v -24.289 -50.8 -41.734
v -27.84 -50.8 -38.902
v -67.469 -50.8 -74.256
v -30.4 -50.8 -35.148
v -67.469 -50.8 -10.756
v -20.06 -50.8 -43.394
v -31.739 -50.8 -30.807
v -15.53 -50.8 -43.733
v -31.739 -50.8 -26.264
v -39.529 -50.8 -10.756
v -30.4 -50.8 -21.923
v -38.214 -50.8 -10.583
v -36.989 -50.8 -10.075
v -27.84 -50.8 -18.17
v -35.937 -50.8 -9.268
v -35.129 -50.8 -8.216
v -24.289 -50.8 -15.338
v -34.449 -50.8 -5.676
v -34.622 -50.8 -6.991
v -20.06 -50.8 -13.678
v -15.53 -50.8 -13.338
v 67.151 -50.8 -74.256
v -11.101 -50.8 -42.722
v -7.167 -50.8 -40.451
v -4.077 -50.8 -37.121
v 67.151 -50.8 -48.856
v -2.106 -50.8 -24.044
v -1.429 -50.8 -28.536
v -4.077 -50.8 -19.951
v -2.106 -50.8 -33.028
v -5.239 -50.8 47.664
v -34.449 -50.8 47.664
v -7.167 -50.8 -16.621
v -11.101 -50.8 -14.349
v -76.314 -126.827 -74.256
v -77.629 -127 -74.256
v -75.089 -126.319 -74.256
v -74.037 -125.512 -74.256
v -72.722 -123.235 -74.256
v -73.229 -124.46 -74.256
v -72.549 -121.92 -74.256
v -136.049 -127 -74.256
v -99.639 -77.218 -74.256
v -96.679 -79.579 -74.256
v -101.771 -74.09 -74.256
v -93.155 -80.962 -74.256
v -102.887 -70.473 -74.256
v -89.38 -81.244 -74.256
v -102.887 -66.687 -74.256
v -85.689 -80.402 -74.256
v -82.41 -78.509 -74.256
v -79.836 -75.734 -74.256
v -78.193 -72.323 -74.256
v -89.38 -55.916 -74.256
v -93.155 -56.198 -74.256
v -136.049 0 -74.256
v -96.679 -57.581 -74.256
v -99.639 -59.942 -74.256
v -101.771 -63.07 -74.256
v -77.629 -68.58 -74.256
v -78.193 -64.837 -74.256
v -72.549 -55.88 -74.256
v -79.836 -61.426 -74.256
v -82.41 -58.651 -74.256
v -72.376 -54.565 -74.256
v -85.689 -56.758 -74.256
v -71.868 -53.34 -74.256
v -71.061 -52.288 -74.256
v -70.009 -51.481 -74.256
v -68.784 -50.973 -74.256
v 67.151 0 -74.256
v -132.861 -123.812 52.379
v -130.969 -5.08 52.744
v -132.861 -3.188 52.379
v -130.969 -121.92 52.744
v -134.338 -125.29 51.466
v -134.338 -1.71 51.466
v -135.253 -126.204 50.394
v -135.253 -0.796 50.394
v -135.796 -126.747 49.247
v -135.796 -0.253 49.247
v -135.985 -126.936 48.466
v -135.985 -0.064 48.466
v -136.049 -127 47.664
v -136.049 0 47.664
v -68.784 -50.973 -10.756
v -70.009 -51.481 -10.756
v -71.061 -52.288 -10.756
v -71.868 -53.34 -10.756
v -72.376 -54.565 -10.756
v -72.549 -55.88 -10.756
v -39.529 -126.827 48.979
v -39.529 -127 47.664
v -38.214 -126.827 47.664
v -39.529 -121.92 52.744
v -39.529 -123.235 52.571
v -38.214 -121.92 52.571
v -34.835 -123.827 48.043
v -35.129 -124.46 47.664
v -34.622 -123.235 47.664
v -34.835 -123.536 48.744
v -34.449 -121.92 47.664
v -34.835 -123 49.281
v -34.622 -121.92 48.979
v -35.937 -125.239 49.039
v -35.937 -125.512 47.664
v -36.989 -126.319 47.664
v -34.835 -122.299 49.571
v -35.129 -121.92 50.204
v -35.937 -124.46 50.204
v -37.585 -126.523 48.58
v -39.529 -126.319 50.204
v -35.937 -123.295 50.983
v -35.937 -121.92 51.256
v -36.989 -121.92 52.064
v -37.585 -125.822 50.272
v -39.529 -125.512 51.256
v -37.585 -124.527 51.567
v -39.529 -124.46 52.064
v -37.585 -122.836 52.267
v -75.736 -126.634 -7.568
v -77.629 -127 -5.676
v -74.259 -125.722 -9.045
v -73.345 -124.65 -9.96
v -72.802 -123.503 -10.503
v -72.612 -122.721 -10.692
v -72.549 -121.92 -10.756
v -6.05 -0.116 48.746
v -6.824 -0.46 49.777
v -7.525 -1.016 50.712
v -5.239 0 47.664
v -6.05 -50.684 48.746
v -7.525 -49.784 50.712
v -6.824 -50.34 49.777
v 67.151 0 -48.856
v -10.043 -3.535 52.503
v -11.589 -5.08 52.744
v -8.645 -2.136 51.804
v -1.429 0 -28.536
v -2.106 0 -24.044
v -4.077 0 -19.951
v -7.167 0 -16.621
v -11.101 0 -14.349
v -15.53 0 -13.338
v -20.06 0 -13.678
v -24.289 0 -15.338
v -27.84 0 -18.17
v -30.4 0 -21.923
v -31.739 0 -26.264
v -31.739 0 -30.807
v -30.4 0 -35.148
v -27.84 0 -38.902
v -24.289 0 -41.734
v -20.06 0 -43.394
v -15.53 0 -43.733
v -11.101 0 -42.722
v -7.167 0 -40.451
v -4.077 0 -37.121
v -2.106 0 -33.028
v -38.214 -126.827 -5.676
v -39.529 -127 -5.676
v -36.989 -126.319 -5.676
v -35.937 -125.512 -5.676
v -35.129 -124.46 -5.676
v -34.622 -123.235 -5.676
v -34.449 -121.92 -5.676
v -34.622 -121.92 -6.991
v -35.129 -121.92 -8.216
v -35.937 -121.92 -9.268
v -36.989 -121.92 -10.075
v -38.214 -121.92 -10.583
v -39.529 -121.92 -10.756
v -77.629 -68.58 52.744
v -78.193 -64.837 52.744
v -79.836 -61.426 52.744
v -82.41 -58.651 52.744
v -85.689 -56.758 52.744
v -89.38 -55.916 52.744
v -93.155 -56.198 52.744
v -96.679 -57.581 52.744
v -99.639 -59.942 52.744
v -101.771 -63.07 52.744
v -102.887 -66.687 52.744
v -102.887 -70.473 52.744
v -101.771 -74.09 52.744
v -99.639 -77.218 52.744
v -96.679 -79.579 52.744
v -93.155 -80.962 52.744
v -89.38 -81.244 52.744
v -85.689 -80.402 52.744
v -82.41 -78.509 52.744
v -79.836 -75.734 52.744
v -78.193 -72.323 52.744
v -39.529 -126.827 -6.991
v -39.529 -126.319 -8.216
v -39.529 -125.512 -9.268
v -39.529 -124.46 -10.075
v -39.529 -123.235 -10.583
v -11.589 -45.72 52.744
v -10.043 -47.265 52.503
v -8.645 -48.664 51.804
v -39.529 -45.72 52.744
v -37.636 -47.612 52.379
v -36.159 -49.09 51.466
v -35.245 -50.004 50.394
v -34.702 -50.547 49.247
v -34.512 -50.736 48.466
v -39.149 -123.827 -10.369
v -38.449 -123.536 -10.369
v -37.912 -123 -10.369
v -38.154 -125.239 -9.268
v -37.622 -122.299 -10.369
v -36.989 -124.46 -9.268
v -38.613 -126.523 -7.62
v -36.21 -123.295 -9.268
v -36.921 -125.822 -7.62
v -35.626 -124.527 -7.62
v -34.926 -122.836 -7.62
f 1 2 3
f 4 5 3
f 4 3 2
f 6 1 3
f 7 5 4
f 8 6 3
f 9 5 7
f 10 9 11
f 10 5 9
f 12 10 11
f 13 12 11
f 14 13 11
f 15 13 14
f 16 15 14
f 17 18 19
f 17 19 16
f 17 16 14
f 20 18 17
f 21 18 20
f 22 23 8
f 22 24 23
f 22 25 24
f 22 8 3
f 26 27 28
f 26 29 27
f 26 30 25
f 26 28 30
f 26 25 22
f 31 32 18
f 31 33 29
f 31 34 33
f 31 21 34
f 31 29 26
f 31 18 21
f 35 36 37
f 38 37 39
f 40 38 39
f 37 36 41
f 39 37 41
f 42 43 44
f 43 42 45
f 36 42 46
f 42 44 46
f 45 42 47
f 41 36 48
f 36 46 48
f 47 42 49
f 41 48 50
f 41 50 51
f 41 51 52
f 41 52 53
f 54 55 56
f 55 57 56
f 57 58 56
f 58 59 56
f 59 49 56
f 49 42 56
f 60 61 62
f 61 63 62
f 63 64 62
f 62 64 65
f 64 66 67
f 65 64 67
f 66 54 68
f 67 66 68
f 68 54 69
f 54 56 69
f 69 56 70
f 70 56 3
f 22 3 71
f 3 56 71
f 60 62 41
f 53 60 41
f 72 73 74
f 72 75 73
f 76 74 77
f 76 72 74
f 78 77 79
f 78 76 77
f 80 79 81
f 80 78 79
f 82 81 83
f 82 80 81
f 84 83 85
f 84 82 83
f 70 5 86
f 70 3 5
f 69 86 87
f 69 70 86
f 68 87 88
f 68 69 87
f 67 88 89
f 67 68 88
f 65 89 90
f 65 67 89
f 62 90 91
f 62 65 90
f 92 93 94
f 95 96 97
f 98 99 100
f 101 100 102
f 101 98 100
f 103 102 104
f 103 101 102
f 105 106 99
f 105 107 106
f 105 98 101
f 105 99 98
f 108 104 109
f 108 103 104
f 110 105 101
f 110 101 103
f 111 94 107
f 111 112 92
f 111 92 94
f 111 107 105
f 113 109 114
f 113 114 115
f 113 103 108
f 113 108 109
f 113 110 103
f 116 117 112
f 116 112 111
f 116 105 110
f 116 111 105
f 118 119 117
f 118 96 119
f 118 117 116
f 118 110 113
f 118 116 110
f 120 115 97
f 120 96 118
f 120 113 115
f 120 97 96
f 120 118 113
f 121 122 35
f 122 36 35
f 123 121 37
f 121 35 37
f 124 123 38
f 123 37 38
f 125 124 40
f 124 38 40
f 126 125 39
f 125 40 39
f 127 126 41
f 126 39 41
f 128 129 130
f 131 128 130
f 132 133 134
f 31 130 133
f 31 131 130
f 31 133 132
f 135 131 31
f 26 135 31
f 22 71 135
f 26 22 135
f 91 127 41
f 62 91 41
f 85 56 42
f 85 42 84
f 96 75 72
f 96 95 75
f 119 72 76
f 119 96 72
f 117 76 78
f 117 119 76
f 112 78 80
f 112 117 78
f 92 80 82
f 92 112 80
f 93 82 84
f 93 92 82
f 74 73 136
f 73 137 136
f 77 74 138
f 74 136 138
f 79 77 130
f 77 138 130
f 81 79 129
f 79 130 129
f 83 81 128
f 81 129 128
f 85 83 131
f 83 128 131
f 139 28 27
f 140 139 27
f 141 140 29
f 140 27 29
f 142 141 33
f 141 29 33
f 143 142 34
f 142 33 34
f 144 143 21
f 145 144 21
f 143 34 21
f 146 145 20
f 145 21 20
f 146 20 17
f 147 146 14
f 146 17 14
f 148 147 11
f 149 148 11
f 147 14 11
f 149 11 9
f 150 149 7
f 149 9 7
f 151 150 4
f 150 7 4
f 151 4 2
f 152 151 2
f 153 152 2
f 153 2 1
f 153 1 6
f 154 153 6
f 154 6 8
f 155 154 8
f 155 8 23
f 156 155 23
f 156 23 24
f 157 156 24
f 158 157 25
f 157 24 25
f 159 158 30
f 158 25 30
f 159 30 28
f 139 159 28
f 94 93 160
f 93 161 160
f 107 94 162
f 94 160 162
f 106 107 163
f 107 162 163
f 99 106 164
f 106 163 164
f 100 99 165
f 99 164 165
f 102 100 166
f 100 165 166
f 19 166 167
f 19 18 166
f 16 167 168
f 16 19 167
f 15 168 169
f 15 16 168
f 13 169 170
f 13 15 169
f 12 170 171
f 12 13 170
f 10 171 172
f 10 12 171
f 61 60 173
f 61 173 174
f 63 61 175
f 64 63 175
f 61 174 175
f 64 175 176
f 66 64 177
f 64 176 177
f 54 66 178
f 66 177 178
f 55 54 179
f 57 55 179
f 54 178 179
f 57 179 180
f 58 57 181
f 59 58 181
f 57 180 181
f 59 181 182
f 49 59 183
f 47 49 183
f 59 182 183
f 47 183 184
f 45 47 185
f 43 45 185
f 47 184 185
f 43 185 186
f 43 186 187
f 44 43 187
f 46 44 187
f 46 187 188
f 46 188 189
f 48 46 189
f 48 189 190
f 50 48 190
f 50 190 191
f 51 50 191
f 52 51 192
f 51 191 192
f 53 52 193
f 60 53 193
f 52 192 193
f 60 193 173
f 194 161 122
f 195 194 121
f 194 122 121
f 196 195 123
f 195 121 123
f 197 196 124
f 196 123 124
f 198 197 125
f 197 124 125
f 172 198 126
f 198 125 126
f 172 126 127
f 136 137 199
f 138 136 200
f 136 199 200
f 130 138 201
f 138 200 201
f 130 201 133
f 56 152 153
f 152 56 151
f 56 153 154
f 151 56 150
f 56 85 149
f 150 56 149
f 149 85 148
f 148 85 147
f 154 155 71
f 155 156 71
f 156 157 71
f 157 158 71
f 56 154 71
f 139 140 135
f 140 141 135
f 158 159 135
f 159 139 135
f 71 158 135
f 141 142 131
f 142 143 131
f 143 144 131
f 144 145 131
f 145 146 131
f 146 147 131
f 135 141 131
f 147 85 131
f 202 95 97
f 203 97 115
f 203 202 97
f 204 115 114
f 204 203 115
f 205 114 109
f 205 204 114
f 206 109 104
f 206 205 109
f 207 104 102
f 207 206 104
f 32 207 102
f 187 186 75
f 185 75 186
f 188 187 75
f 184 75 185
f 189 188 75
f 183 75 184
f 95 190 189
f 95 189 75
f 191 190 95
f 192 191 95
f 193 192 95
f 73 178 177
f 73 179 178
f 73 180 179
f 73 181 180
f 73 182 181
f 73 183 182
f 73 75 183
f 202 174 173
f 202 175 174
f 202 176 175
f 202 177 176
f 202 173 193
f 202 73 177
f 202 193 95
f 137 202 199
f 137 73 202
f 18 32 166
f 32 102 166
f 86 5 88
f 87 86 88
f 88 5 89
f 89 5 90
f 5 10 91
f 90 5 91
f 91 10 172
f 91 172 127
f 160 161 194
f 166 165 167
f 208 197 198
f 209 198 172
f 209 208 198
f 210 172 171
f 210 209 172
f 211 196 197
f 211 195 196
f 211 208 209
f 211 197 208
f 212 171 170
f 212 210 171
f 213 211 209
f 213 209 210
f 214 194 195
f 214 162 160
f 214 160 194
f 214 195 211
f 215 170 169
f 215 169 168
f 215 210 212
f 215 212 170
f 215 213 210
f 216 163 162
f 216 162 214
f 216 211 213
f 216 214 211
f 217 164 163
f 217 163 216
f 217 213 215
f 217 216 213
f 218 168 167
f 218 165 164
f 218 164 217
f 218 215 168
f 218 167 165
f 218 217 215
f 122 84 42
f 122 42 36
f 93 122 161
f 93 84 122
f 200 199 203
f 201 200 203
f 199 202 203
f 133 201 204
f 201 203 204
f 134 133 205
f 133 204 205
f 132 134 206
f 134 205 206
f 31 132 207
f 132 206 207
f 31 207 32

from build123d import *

# Parameters (mm, degrees)
F0_W     = 203.2
F0_H     = 127
F1_DEPTH = 127
F3_DEPTH = 76.2
F4_SIZE2 = 101.6
F4_SIZE  = 76.2
F5_R     = 5.08
F6_R     = 15.24
F7_DEPTH = 50.8
F8_R     = 12.7
F9_DEPTH = 127


with BuildPart() as f1:
    # F0 (on Front) → F1 (new body)
    with BuildSketch(Plane.XZ):
        with Locations((-34.4487503171, -10.7558194239)):
            Rectangle(F0_W, F0_H)
    extrude(amount=F1_DEPTH)

    # F2 (on face) → F3 (cut)
    with BuildSketch(Plane.XZ.offset(127)):
        Polygon((67.1512496829, 52.7441805761), (-34.4487503171, 52.7441805761), (-34.4487503171, -10.7558194239), (-72.5487503171, -10.7558194239), (-72.5487503171, -74.2558194239), (67.1512496829, -74.2558194239), align=None)
    extrude(amount=-F3_DEPTH, mode=Mode.SUBTRACT)

    # F4
    f4_edges = [f1.edges().sort_by_distance(p)[0] for p in [
        (67.15125, -25.4, 52.744181),
    ]]
    f4_side = f1.faces().sort_by_distance((-56.220179, -52.614286, 52.744181))[0]
    chamfer(f4_edges, length=F4_SIZE, length2=F4_SIZE2, reference=f4_side)

    # F5
    f5_edges = [f1.edges().sort_by_distance(p)[0] for p in [
        (-136.04875, -63.5, 52.744181),
        (-85.24875, -127, 52.744181),
        (-34.44875, -127, 20.994181),
        (-53.49875, -127, -10.755819),
        (-72.54875, -127, -42.505819),
        (-72.54875, -50.8, -42.505819),
        (-34.44875, -88.9, -10.755819),
        (-34.44875, -88.9, 52.744181),
        (-21.74875, -50.8, 52.744181),
        (-72.54875, 0, 52.744181),
        (-9.04875, -25.4, 52.744181),
    ]]
    fillet(f5_edges, radius=F5_R)

    # F6 (on face) → F7 (cut, through all)
    with BuildSketch(Plane.XZ.offset(50.8)):
        with Locations((-16.6687503171, -28.5358194239)):
            Circle(F6_R)
    extrude(amount=-F7_DEPTH, mode=Mode.SUBTRACT)

    # F8 (on face) → F9 (cut, through all)
    with BuildSketch(Plane.XY.offset(52.7441805761)):
        with Locations((-90.3287503171, -68.58)):
            Circle(F8_R)
    extrude(amount=-F9_DEPTH, mode=Mode.SUBTRACT)


solid = f1.part
